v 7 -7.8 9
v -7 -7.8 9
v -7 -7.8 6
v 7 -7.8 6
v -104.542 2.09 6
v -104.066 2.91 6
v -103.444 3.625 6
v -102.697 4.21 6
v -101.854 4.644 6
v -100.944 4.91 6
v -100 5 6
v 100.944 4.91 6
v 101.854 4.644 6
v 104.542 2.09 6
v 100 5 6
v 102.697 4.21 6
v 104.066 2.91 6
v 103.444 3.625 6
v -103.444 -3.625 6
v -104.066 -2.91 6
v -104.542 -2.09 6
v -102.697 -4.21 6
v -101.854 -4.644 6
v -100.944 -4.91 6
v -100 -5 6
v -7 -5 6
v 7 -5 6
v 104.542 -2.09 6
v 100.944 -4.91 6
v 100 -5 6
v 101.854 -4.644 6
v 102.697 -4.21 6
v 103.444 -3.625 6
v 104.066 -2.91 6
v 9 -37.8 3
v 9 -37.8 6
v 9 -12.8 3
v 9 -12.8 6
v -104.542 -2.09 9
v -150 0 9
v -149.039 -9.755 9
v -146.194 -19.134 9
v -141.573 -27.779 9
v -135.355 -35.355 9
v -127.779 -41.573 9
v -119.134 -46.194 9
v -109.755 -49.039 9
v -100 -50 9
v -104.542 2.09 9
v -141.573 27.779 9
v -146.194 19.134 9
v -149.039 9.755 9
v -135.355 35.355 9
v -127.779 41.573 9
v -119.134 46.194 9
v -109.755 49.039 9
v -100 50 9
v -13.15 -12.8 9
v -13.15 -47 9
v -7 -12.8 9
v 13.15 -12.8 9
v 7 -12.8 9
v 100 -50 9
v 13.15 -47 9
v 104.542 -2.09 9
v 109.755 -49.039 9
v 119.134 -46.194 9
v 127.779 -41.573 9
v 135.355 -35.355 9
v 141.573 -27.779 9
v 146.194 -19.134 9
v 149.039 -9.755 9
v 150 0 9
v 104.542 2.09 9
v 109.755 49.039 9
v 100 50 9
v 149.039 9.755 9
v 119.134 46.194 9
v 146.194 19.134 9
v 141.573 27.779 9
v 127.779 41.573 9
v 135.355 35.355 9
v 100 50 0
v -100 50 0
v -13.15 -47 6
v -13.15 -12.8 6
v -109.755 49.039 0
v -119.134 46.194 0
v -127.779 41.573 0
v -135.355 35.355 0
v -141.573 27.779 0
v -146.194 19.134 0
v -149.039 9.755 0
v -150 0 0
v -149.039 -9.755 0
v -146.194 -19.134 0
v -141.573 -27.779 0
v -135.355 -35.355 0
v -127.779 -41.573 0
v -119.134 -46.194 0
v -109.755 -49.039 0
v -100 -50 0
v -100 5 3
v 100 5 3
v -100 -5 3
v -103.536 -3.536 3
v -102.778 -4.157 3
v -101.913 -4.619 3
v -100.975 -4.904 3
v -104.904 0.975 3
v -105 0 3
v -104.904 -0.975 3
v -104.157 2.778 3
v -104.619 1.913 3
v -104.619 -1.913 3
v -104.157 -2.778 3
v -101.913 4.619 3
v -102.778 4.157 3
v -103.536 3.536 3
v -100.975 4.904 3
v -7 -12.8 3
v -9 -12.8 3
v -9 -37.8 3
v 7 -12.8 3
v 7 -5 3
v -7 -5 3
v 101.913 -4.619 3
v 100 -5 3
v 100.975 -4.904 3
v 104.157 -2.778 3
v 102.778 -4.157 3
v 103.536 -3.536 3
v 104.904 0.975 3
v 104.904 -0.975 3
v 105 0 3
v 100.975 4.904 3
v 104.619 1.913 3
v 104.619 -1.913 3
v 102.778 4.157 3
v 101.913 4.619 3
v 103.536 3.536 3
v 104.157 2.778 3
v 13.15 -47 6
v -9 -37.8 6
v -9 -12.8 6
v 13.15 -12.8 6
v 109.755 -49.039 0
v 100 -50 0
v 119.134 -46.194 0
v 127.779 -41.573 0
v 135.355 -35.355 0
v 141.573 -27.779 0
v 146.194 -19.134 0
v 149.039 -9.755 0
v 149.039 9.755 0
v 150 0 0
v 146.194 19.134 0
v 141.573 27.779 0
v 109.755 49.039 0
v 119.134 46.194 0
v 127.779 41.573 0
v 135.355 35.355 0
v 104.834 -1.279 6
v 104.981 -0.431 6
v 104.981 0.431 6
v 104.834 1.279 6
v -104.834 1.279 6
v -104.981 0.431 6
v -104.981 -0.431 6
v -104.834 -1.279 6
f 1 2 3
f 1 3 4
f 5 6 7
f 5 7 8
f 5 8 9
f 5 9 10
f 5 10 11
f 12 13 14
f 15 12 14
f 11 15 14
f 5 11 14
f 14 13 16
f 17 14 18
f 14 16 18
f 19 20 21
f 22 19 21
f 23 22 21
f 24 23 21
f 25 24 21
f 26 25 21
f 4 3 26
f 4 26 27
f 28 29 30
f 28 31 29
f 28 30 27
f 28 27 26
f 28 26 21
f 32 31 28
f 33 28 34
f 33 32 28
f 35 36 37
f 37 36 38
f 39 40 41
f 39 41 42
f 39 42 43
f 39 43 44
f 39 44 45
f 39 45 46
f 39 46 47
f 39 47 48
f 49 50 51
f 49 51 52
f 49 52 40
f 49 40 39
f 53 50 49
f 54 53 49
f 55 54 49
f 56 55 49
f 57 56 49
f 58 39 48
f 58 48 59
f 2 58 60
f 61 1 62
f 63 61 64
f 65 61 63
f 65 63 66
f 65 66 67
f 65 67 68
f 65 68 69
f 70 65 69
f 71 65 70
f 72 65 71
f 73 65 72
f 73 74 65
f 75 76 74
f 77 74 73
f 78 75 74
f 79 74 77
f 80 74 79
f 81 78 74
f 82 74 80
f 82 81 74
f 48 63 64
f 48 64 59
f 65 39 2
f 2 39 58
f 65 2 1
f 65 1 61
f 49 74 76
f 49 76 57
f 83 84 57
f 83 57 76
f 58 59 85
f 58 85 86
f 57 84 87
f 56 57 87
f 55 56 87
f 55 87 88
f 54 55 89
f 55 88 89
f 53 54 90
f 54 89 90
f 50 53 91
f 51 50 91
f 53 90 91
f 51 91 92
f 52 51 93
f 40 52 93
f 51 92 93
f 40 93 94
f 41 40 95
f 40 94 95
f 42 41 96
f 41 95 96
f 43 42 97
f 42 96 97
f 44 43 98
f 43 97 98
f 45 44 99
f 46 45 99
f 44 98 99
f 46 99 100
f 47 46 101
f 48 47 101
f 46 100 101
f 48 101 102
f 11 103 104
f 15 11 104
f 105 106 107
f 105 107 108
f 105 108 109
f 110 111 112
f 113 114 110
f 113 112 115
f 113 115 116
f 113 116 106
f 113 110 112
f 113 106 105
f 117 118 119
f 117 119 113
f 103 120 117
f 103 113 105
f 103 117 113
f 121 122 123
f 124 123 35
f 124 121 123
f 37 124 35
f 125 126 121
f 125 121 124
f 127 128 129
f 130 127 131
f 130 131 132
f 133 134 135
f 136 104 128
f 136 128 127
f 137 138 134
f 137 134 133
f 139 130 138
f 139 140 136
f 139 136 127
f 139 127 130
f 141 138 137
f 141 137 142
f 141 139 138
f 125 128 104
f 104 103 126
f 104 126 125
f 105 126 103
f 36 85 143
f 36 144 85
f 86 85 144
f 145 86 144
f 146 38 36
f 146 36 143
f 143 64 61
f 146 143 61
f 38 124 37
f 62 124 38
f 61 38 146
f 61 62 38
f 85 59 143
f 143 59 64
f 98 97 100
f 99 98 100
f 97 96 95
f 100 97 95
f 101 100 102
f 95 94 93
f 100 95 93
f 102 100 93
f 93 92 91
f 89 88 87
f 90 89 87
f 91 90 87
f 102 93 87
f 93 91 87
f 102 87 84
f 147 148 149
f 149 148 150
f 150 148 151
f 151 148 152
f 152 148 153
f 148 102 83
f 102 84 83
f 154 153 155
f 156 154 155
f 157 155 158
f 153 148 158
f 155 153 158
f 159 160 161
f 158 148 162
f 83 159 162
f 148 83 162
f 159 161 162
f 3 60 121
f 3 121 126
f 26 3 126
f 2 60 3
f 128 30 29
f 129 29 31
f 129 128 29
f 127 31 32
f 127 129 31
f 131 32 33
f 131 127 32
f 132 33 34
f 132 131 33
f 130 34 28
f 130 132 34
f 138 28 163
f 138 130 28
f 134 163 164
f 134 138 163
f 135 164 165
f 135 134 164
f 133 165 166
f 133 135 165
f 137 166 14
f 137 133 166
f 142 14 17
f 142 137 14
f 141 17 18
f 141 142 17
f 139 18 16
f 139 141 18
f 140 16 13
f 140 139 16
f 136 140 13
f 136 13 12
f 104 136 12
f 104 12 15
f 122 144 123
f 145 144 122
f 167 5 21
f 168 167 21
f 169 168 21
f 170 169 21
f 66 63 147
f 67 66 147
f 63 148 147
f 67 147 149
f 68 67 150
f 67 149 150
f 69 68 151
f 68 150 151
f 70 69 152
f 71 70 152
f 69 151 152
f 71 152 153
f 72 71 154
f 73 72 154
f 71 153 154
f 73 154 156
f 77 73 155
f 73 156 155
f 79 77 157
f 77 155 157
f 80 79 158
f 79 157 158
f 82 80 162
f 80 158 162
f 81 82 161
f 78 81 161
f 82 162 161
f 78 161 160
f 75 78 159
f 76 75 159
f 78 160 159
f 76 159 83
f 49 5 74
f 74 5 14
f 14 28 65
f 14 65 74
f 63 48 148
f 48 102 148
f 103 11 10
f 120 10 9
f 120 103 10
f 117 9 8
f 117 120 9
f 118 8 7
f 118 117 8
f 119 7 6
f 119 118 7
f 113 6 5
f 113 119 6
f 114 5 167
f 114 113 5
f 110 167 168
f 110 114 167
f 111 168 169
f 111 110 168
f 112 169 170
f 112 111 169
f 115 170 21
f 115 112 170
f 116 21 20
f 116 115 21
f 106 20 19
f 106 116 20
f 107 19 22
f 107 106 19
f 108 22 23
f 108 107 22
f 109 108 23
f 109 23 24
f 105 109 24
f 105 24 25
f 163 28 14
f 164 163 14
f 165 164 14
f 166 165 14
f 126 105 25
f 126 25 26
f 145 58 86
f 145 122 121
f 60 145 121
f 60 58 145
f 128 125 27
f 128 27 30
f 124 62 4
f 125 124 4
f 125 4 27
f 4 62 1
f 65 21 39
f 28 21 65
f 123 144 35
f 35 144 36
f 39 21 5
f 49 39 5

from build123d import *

# Parameters (mm, degrees)
PAD_DEPTH       = 3
PAD001_DEPTH    = 3
SKETCH002_W     = 209.08447
SKETCH002_H     = 4.18
PAD002_DEPTH    = 3
SKETCH003_W     = 26.3
SKETCH003_H     = 34.2
POCKET_DEPTH    = 3
SKETCH004_W     = 18
SKETCH004_H     = 25
POCKET001_DEPTH = 3
SKETCH005_W     = 14
SKETCH005_H     = 5
POCKET002_DEPTH = 6
SKETCH006_W     = 14
SKETCH006_H     = 3
POCKET003_DEPTH = 3


with BuildPart() as part:
    # Sketch → Pad (new body)
    with BuildSketch(Plane.XY):
        with BuildLine():
            ThreePointArc((-100, 50), (-150, 0), (-100, -50))
            Line((-100, -50), (100, -50))
            ThreePointArc((100, -50), (150, 0), (100, 50))
            Line((-100, 50), (100, 50))
        make_face()
    extrude(amount=PAD_DEPTH)

    # Sketch001 (on Face6 of Pad) → Pad001 (join)
    with BuildSketch(Plane.XY.offset(3)):
        with BuildLine():
            ThreePointArc((-100, 50), (-150, 0), (-100, -50))
            Line((-100, -50), (100, -50))
            ThreePointArc((100, -50), (150, 0), (100, 50))
            Line((-100, 50), (100, 50))
        make_face()
        with BuildLine():
            ThreePointArc((-100, 5), (-105, 0), (-100, -5))
            Line((-100, -5), (100, -5))
            ThreePointArc((100, -5), (105, 0), (100, 5))
            Line((-100, 5), (100, 5))
        make_face(mode=Mode.SUBTRACT)
    extrude(amount=PAD001_DEPTH)

    # Sketch002 (on Face9 of Pad001) → Pad002 (join)
    with BuildSketch(Plane.XY.offset(6)):
        with BuildLine():
            ThreePointArc((-100, 50), (-150, 0), (-100, -50))
            Line((-100, -50), (100, -50))
            ThreePointArc((100, -50), (150, 0), (100, 50))
            Line((-100, 50), (100, 50))
        make_face()
        Rectangle(SKETCH002_W, SKETCH002_H, mode=Mode.SUBTRACT)
    extrude(amount=PAD002_DEPTH)

    # Sketch003 (on Face13 of Pad002) → Pocket (cut)
    with BuildSketch(Plane.XY.offset(9)):
        with Locations((0, -29.9)):
            Rectangle(SKETCH003_W, SKETCH003_H)
    extrude(amount=-POCKET_DEPTH, mode=Mode.SUBTRACT)

    # Sketch004 (on Face27 of Pocket) → Pocket001 (cut)
    with BuildSketch(Plane.XY.offset(6)):
        with Locations((0, -25.3)):
            Rectangle(SKETCH004_W, SKETCH004_H)
    extrude(amount=-POCKET001_DEPTH, mode=Mode.SUBTRACT)

    # Sketch005 (on Face13 of Pocket001) → Pocket002 (cut)
    with BuildSketch(Plane.XY.offset(9)):
        with Locations((0, -10.3)):
            Rectangle(SKETCH005_W, SKETCH005_H)
    extrude(amount=-POCKET002_DEPTH, mode=Mode.SUBTRACT)

    # Sketch006 (on Face23 of Pocket002) → Pocket003 (cut)
    with BuildSketch(Plane.XZ.offset(7.8)):
        with Locations((0, 4.5)):
            Rectangle(SKETCH006_W, SKETCH006_H)
    extrude(amount=-POCKET003_DEPTH, mode=Mode.SUBTRACT)


solid = part.part
